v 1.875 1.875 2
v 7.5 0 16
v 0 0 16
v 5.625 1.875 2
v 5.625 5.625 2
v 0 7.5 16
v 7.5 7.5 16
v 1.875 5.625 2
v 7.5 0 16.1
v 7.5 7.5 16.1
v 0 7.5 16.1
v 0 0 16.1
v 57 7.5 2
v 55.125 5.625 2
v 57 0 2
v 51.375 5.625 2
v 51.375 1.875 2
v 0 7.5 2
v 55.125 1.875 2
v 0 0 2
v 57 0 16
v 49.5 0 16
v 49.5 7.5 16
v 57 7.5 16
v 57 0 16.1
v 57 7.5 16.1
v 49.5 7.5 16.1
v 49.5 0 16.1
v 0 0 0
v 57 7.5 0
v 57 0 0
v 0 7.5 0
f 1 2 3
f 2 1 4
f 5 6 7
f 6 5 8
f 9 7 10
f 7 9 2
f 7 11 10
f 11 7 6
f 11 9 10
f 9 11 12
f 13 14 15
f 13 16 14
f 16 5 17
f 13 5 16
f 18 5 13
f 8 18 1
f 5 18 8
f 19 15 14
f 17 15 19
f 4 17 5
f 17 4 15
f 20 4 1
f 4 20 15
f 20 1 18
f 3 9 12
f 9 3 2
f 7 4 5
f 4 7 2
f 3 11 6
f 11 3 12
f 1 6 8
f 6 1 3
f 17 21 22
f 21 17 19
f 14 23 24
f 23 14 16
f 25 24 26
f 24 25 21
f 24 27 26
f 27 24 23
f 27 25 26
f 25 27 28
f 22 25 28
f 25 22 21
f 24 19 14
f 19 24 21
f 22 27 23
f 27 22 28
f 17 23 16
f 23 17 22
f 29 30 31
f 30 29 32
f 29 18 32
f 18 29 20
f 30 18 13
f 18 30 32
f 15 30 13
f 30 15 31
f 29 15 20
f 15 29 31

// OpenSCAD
$outer_width = 57;
$inner_width = 42;
$holderwidth = ($outer_width - $inner_width) / 2;
$schwertdicke = 14; //schwertdicke ist dicke an der Stelle bis zur Wand (dickste Stelle des Schwertes)
$thickness = 2;
module connector() {
hull() {
    
    translate([$holderwidth / 4,$holderwidth / 4,$thickness])
linear_extrude(height = 0.1)
square([$holderwidth/2, $holderwidth/2]);

translate([0,0,$schwertdicke+$thickness])
linear_extrude(height = 0.1)
square([$holderwidth, $holderwidth]);
}
}

connector();
translate([$inner_width+$holderwidth,0,0])
connector();

linear_extrude(height = $thickness)
square([$outer_width, $holderwidth]);
